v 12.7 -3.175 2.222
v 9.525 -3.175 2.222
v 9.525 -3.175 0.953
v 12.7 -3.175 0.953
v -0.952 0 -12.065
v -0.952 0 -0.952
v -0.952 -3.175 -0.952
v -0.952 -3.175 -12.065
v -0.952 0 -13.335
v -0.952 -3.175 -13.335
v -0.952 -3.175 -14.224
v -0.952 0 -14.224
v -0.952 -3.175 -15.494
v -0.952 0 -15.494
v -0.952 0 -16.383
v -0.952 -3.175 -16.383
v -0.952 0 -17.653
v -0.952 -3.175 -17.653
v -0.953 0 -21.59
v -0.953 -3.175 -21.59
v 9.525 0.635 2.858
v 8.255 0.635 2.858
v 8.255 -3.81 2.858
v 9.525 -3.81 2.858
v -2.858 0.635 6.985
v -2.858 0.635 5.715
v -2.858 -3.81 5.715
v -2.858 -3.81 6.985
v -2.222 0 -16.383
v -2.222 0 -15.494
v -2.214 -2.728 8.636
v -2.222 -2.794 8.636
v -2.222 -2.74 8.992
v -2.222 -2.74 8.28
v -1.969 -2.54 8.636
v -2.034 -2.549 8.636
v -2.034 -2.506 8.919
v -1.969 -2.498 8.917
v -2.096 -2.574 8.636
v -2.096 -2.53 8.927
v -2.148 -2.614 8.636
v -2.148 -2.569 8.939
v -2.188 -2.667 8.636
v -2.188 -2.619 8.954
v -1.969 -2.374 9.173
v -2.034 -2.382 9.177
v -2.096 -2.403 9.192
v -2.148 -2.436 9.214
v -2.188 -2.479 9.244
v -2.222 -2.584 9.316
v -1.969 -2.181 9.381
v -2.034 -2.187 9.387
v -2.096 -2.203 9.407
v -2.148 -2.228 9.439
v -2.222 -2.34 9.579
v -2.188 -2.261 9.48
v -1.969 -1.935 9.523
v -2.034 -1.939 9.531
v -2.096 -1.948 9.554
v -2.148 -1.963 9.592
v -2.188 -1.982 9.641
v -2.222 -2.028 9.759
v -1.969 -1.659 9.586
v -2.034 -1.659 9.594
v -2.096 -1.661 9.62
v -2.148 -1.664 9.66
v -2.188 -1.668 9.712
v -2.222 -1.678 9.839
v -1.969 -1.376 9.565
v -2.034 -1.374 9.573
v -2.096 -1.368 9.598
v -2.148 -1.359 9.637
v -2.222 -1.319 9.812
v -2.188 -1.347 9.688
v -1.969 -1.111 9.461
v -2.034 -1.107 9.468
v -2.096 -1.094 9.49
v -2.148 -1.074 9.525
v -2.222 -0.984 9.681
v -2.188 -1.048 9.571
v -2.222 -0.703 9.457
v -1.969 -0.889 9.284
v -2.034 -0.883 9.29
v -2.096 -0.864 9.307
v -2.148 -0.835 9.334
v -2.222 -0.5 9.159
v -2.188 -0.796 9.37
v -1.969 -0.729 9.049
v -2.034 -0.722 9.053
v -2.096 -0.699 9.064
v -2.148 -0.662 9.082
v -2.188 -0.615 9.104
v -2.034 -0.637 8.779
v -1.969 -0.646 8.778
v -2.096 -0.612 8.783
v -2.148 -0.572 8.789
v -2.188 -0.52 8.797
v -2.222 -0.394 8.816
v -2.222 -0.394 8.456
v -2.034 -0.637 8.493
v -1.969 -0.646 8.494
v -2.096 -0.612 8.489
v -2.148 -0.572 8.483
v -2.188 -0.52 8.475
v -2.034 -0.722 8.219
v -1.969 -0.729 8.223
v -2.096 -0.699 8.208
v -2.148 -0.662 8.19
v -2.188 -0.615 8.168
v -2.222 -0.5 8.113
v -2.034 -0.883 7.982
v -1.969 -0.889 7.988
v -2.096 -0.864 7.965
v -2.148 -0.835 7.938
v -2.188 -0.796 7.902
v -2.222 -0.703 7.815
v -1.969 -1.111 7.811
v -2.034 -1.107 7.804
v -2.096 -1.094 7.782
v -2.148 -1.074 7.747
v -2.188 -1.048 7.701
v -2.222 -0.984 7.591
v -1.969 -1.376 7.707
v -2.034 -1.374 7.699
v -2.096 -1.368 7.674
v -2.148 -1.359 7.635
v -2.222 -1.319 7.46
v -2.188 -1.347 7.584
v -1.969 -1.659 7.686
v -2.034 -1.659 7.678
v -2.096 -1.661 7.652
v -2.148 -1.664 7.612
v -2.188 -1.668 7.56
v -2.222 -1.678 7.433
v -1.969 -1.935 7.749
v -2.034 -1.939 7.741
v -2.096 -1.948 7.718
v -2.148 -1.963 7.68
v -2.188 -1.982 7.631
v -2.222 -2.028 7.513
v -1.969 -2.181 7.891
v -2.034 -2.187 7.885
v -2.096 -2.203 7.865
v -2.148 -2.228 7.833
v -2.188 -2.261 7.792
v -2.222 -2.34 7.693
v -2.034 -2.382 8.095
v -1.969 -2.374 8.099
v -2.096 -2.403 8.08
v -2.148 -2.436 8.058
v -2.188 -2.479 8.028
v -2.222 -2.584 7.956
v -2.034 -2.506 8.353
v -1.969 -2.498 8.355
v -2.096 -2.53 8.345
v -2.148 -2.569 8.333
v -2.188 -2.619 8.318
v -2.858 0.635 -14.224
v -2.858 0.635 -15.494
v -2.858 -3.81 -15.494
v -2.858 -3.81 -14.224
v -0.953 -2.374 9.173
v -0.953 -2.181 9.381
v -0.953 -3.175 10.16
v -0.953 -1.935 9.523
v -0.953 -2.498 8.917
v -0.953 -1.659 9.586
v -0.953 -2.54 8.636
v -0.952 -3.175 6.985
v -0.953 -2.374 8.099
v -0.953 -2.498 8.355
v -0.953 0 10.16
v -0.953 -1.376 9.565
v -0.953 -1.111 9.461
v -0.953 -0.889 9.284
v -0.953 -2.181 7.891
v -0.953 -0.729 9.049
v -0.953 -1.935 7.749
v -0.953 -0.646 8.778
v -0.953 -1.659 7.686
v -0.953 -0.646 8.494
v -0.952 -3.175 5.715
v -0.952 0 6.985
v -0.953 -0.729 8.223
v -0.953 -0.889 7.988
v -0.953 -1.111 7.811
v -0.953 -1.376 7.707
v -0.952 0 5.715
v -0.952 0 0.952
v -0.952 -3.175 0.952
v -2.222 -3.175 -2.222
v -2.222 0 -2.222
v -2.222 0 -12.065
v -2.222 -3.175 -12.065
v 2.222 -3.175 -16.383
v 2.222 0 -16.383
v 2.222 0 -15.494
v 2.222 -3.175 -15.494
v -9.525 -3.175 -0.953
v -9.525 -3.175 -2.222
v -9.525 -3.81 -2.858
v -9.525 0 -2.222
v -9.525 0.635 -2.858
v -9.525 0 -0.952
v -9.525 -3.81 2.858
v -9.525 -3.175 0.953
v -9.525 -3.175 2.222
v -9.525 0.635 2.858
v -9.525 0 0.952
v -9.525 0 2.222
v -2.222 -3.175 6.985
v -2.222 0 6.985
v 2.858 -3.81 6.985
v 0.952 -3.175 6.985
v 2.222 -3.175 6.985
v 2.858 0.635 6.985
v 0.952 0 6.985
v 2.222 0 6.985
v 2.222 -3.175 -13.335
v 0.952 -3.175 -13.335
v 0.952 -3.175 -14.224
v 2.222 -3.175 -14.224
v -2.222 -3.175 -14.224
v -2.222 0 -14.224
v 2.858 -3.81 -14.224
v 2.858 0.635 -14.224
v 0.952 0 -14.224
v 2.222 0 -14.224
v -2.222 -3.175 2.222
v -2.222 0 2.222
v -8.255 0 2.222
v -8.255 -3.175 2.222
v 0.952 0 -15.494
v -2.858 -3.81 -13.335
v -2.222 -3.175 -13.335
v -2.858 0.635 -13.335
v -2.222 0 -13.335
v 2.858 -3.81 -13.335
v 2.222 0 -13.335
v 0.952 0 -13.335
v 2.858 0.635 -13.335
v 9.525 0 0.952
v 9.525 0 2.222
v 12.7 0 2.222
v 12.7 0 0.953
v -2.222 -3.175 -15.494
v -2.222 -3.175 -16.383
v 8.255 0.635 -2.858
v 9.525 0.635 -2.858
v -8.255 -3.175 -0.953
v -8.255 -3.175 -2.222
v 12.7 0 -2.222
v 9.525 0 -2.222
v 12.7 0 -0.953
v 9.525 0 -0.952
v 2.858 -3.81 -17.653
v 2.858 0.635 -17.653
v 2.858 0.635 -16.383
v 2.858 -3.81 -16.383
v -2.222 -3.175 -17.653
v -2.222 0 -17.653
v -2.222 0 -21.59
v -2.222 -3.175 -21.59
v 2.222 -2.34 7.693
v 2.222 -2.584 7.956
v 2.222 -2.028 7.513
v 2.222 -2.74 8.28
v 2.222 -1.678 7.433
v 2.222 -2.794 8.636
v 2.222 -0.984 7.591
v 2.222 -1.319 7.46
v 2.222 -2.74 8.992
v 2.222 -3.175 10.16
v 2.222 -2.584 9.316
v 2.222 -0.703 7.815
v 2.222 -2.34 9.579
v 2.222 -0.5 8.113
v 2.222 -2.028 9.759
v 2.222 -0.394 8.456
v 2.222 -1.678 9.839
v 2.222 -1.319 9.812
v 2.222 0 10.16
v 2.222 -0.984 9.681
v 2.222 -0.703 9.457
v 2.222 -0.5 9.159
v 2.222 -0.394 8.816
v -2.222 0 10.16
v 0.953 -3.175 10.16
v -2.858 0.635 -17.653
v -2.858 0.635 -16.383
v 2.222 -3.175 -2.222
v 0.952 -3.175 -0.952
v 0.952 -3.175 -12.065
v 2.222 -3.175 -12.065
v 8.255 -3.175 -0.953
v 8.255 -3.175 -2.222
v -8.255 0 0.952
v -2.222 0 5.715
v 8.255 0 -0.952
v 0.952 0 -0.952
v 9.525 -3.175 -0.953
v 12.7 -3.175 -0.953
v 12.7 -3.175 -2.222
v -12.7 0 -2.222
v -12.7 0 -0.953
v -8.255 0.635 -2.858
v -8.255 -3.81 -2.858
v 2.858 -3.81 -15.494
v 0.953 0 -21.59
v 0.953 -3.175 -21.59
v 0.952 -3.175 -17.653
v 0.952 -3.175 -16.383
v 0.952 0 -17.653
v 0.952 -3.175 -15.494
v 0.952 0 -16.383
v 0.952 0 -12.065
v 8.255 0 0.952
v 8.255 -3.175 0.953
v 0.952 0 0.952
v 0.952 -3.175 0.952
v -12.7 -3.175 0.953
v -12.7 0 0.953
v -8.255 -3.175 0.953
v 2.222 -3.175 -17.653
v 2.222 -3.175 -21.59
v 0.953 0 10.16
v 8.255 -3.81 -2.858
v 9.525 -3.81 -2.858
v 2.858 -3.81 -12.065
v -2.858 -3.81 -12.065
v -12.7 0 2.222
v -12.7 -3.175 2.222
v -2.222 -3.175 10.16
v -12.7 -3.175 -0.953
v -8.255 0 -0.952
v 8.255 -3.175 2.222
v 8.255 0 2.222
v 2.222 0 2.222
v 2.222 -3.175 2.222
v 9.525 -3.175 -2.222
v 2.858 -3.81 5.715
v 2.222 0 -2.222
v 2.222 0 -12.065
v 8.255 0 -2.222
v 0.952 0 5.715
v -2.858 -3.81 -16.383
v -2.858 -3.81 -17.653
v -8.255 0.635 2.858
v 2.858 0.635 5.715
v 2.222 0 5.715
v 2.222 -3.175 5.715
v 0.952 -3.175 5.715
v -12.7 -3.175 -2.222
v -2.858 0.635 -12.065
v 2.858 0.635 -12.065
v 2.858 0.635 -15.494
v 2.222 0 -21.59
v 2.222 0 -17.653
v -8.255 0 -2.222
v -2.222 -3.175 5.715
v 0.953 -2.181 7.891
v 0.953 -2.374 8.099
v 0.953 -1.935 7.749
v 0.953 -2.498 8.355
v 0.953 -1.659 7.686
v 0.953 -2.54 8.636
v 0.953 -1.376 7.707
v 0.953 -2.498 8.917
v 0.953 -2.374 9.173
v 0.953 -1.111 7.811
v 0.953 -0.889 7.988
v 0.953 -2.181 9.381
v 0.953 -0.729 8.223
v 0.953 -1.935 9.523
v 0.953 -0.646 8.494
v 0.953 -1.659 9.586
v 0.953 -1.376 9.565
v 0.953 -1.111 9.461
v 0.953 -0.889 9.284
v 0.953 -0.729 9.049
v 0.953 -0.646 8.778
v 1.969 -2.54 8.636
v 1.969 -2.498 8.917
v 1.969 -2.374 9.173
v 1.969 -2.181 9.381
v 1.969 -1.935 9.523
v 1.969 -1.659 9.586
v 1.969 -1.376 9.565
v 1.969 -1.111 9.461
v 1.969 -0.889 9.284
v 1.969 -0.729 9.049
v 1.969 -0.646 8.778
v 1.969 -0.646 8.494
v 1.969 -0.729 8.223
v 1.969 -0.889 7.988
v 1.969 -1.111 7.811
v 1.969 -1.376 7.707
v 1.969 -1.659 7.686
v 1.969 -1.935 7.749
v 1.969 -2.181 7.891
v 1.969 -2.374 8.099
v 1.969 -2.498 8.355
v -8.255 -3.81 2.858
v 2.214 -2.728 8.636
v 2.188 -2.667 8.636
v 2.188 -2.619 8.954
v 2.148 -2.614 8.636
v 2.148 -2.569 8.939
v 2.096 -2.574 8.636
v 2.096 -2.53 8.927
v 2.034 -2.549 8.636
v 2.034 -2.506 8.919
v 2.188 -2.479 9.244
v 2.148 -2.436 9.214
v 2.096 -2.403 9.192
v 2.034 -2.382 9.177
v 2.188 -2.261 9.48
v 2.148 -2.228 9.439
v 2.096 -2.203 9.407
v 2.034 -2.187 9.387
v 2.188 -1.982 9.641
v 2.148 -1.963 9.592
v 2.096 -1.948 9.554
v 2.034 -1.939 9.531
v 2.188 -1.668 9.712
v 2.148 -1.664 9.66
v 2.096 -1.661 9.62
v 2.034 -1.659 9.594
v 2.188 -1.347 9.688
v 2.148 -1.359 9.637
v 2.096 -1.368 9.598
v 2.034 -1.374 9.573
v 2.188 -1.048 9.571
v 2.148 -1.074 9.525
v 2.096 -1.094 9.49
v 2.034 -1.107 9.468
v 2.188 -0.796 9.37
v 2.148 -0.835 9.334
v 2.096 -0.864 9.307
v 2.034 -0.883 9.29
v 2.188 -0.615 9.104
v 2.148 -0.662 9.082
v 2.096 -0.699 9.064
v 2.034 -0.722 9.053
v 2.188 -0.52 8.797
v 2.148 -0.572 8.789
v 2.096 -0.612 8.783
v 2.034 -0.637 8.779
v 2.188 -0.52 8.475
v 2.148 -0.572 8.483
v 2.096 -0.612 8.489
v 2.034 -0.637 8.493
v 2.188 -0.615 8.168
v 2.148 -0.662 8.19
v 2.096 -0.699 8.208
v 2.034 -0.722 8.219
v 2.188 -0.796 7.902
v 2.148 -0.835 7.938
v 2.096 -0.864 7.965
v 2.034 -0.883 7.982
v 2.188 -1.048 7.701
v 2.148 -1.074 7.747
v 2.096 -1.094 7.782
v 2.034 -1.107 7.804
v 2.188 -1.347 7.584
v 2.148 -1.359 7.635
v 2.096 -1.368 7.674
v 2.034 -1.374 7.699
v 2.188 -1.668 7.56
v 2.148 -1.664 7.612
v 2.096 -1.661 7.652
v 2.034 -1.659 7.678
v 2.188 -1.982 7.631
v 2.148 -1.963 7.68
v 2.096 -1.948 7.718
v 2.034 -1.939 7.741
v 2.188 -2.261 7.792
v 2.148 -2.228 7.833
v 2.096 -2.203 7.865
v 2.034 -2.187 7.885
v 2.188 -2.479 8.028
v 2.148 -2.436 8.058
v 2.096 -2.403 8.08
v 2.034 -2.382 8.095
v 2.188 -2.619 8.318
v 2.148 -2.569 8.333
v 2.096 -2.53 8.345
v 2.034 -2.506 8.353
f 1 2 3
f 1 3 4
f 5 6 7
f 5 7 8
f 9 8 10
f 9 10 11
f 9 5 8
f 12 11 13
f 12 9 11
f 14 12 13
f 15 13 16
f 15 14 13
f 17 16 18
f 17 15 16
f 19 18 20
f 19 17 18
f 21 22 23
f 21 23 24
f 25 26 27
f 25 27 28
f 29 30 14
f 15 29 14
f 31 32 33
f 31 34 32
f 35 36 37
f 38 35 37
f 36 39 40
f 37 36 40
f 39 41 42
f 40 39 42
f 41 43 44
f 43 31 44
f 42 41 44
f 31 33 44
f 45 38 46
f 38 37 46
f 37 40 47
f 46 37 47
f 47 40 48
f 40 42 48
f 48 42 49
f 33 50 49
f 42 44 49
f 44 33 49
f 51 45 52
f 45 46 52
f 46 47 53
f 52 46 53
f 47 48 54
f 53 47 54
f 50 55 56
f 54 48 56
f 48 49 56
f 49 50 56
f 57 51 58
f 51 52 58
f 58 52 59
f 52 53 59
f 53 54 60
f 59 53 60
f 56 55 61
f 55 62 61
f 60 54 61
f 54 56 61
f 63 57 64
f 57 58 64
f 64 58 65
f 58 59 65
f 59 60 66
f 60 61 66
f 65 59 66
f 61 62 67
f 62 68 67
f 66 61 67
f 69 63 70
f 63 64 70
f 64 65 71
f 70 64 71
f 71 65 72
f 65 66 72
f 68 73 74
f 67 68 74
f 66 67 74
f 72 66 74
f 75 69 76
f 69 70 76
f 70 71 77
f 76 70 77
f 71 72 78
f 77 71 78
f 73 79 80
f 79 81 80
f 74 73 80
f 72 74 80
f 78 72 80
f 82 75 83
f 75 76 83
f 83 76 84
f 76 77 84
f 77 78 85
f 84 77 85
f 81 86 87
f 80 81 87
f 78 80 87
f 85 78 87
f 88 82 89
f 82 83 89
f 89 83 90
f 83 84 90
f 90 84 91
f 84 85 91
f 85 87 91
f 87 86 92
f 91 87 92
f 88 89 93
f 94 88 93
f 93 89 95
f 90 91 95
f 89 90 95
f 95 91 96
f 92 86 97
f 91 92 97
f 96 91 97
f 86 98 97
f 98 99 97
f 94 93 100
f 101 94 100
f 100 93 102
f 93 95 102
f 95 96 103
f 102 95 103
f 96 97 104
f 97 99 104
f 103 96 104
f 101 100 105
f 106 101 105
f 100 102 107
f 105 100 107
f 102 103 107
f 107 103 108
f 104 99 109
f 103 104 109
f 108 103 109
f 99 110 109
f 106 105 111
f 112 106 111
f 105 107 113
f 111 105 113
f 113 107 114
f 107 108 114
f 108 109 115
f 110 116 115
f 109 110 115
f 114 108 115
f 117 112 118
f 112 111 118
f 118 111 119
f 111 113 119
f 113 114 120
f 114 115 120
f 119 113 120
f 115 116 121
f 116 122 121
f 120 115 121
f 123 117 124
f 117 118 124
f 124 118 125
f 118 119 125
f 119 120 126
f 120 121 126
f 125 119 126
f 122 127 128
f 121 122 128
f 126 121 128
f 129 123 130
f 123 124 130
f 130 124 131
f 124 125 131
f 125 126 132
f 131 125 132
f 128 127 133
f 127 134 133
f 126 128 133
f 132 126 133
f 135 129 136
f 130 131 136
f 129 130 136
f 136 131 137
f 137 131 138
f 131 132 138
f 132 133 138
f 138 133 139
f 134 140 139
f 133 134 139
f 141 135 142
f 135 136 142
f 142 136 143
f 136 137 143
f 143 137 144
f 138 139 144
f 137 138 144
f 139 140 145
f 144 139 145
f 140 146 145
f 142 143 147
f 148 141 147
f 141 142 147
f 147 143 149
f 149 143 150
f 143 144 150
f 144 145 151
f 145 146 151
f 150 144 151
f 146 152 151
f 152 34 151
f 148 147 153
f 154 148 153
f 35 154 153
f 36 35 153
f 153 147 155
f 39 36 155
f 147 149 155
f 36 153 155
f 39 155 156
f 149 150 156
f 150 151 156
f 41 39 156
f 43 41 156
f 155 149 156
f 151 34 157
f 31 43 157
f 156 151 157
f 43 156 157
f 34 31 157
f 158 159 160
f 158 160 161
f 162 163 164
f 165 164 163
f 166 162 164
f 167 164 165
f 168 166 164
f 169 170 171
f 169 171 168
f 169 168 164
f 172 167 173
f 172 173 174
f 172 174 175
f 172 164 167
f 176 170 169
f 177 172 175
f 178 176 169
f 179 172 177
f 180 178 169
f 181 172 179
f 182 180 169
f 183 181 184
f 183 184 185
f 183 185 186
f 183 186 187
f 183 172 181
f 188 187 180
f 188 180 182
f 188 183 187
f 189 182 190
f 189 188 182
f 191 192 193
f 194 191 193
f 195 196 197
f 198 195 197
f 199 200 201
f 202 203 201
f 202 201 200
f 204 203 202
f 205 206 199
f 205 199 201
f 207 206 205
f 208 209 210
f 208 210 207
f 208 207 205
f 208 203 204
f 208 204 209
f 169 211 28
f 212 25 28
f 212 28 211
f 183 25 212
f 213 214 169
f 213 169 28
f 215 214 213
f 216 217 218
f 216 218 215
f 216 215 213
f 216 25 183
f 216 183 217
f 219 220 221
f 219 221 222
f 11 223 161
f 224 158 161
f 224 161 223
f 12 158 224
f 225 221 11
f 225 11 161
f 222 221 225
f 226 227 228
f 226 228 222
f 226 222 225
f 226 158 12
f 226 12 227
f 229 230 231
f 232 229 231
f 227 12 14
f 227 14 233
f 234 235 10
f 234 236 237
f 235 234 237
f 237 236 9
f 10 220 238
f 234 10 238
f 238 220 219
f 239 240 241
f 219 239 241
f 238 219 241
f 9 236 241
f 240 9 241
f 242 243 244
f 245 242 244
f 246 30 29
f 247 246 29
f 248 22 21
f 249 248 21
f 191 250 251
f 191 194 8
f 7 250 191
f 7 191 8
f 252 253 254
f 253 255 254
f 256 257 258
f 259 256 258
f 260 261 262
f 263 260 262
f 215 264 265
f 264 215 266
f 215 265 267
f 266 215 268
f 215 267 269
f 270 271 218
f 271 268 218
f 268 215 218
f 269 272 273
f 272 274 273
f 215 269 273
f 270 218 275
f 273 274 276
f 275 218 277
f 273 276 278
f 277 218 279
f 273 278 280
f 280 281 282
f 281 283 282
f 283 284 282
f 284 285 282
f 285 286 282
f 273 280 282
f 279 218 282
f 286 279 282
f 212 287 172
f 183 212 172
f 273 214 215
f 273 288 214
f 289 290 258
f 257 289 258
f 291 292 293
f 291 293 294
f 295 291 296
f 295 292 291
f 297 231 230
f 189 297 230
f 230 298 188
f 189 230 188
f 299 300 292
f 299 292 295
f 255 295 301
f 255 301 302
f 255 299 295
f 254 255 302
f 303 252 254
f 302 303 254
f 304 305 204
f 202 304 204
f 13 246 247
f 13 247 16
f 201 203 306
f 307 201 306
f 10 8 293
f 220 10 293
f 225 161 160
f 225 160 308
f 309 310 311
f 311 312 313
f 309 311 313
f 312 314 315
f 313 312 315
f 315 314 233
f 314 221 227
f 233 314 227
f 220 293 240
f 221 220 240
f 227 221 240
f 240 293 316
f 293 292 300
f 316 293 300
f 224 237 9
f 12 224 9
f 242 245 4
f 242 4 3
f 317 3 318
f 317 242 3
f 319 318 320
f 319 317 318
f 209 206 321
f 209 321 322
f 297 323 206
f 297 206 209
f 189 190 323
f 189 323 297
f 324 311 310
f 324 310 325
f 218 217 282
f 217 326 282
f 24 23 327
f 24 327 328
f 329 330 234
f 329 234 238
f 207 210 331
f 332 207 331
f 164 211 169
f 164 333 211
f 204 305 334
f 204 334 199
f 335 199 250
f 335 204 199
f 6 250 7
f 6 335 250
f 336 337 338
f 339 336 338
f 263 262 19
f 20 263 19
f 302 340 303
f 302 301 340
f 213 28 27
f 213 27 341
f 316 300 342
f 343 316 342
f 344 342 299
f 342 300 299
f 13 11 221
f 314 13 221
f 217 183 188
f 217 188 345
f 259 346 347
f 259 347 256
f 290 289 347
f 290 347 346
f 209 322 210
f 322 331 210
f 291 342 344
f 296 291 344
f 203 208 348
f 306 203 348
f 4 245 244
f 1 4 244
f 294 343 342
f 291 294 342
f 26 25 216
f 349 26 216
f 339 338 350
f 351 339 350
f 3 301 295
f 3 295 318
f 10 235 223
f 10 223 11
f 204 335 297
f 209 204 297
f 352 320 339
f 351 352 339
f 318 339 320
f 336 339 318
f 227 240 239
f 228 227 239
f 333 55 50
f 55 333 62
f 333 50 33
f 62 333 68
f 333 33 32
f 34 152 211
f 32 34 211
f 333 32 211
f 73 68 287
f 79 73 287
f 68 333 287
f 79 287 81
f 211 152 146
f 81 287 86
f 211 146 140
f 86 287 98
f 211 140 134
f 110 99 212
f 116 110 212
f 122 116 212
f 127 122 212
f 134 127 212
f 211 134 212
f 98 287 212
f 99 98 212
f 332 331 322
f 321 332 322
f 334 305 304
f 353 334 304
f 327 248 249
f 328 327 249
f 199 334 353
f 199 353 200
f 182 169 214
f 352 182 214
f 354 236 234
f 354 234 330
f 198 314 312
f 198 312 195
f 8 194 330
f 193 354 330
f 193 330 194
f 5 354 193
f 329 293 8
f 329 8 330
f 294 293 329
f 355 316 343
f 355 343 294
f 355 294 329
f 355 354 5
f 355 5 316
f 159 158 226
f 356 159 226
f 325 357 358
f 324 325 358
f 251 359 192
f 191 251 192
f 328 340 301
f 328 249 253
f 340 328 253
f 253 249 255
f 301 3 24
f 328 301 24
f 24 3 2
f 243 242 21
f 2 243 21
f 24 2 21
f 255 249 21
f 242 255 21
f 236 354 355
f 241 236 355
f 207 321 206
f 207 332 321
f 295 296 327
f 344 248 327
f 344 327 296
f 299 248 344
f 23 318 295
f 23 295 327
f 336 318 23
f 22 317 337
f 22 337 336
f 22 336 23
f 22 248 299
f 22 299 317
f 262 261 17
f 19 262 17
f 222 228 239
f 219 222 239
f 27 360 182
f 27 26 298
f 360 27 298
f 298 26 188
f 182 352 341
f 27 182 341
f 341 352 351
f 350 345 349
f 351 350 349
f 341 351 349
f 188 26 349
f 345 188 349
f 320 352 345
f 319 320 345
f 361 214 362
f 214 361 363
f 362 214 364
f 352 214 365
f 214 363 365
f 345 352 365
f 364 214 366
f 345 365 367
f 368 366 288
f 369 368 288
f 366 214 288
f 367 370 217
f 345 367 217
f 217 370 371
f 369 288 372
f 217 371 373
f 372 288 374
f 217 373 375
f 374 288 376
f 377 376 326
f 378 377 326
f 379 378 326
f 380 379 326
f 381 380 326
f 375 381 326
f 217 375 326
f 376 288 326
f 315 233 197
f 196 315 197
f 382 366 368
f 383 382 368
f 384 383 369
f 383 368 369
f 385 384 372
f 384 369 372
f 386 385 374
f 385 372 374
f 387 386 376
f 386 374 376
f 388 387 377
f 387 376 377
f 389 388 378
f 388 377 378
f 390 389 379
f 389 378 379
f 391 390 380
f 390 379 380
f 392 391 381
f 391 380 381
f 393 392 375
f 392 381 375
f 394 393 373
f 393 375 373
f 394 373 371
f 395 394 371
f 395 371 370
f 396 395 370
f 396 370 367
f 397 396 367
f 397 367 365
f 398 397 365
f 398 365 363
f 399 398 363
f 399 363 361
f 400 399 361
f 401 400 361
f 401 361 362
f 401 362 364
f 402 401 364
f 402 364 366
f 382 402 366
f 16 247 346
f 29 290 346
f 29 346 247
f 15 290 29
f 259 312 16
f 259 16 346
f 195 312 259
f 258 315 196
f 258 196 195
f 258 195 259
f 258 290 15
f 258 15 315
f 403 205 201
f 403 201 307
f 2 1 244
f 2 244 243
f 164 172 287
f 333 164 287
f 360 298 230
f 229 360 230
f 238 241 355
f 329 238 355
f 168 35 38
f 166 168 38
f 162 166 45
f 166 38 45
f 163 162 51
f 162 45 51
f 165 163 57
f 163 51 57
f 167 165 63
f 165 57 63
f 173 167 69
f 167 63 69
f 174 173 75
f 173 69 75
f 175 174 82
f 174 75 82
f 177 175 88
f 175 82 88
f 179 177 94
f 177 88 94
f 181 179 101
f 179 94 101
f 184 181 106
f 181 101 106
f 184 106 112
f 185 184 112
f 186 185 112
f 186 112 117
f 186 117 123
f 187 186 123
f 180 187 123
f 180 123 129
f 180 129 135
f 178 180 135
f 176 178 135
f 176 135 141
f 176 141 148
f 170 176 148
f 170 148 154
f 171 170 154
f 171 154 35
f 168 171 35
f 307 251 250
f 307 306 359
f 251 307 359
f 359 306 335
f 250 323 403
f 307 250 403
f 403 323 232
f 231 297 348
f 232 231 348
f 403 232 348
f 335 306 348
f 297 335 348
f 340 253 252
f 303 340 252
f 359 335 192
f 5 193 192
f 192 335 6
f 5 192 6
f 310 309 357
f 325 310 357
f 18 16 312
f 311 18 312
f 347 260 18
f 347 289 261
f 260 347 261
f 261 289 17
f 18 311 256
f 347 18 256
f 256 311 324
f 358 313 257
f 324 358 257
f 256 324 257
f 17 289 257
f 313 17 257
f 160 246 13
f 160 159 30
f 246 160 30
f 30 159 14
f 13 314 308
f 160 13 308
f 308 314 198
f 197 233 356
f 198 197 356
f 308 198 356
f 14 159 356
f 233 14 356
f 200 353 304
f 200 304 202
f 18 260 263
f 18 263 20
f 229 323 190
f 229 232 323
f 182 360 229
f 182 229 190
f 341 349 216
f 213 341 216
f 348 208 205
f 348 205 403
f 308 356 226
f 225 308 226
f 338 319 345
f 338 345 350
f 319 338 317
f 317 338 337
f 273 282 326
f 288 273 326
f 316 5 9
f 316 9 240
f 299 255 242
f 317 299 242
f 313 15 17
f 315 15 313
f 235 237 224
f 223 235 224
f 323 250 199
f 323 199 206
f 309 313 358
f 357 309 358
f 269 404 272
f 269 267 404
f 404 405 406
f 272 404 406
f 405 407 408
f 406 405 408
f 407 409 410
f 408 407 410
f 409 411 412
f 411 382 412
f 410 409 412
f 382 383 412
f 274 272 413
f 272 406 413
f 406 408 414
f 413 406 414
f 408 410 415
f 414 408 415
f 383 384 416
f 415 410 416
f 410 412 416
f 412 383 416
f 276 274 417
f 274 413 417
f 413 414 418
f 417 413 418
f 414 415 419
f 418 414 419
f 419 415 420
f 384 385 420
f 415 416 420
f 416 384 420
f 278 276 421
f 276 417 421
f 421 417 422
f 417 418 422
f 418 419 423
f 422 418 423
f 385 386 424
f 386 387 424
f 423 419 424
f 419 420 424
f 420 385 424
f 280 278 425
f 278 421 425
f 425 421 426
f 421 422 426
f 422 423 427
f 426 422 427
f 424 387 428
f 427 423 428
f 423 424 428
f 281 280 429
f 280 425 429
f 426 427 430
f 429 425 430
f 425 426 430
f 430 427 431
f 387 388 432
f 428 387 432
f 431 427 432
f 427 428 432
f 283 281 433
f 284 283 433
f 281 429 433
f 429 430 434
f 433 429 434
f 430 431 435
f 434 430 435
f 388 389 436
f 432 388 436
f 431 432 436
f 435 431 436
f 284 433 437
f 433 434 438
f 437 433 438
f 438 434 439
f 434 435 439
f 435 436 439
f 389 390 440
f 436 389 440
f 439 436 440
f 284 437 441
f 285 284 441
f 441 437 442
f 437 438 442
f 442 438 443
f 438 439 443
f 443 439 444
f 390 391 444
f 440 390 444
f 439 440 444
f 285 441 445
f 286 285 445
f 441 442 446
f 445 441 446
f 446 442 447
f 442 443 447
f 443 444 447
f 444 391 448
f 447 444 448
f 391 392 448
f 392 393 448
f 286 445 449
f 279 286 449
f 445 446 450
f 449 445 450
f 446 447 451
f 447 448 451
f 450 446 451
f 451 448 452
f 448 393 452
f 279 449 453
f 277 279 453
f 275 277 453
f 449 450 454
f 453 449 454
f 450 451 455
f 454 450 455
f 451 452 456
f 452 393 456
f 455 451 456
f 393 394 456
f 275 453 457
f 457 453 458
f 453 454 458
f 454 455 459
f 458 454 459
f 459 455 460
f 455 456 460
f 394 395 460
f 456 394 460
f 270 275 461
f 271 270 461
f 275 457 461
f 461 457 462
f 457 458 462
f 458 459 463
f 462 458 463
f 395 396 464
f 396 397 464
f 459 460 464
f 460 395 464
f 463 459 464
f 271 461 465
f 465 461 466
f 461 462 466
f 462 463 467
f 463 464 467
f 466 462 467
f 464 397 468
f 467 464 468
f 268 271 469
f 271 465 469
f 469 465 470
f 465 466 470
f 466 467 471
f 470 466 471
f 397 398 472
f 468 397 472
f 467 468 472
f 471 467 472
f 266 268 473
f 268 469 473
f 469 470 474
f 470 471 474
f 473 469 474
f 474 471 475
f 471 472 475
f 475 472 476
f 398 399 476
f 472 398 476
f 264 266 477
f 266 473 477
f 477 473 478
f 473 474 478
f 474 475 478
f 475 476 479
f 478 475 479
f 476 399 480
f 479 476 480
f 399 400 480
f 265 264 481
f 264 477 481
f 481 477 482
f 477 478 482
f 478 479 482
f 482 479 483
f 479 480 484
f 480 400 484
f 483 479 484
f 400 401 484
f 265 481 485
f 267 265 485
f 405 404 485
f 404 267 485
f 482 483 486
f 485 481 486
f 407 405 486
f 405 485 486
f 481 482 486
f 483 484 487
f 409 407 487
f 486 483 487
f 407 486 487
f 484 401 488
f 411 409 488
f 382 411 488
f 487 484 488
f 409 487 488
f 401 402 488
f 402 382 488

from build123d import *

# Parameters (mm, degrees)
F1_DEPTH  = 3.175
F3_DEPTH  = 3.176
F5_W      = 1.27
F5_H      = 5.715
F5_W_2    = 5.715
F5_H_2    = 1.27
F6_DEPTH  = 4.445
F7_W      = 1.905
F7_H      = 3.175
F8_DEPTH  = 25.4
F9_W      = 3.175
F9_H      = 1.905
F10_DEPTH = 19.05
F11_R     = 0.9525
F12_DEPTH = 14.9235
F13_R     = 0.254


with BuildPart() as f1:
    # F0 (on Front) → F1 (new body)
    with BuildSketch(Plane.XZ):
        Polygon((2.2225, 10.16), (-2.2225, 10.16), (-2.2225, 2.2225), (-12.7, 2.2225), (-12.7, -2.2225), (-2.2225, -2.2225), (-2.2225, -21.59), (2.2225, -21.59), (2.2225, -2.2225), (12.7, -2.2225), (12.7, 2.2225), (2.2225, 2.2225), align=None)
    extrude(amount=F1_DEPTH)

    # F2 (on Front) → F3 (cut, through all)
    with BuildSketch(Plane.XZ):
        Polygon((-0.9525, -22.86), (0.9525, -22.86), (0.9525, -0.9525), (15.875, -0.9525), (15.875, 0.9525), (0.9525, 0.9525), (0.9525, 22.86), (-0.9525, 22.86), (-0.9525, 0.9525), (-15.875, 0.9525), (-15.875, -0.9525), (-0.9525, -0.9525), align=None)
    extrude(amount=F3_DEPTH, mode=Mode.SUBTRACT)

    # F5 (on offset) → F6 (join)
    with BuildSketch(Plane.XZ.offset(-0.635)):
        with Locations((-8.89, 0)):
            Rectangle(F5_W, F5_H)
        with Locations((8.89, 0)):
            Rectangle(F5_W, F5_H)
        with Locations((0, 6.35)):
            Rectangle(F5_W_2, F5_H_2)
        with Locations((0, -12.7)):
            Rectangle(F5_W_2, F5_H_2)
        with Locations((0, -14.859)):
            Rectangle(F5_W_2, F5_H_2)
        with Locations((0, -17.018)):
            Rectangle(F5_W_2, F5_H_2)
    extrude(amount=F6_DEPTH)

    # F7 (on Top) → F8 (cut, symmetric)
    with BuildSketch(Plane.XY):
        with Locations((0, -1.5875)):
            Rectangle(F7_W, F7_H)
    extrude(amount=F8_DEPTH, both=True, mode=Mode.SUBTRACT)

    # F9 (on Right) → F10 (cut, symmetric)
    with BuildSketch(Plane.YZ):
        with Locations((-1.5875, 0)):
            Rectangle(F9_W, F9_H)
    extrude(amount=F10_DEPTH, both=True, mode=Mode.SUBTRACT)

    # F11 (on face) → F12 (cut, through all)
    with BuildSketch(Plane(origin=(-2.2225, 0, 0), x_dir=(0, -1, 0), z_dir=(-1, 0, 0))):
        with Locations((1.5875, 8.636)):
            Circle(F11_R)
    extrude(amount=-F12_DEPTH, mode=Mode.SUBTRACT)

    # F13
    f13_edges = [f1.edges().sort_by_distance(p)[0] for p in [
        (-2.2225, -0.635, 8.636),
        (2.2225, -0.635, 8.636),
    ]]
    fillet(f13_edges, radius=F13_R)


solid = f1.part
